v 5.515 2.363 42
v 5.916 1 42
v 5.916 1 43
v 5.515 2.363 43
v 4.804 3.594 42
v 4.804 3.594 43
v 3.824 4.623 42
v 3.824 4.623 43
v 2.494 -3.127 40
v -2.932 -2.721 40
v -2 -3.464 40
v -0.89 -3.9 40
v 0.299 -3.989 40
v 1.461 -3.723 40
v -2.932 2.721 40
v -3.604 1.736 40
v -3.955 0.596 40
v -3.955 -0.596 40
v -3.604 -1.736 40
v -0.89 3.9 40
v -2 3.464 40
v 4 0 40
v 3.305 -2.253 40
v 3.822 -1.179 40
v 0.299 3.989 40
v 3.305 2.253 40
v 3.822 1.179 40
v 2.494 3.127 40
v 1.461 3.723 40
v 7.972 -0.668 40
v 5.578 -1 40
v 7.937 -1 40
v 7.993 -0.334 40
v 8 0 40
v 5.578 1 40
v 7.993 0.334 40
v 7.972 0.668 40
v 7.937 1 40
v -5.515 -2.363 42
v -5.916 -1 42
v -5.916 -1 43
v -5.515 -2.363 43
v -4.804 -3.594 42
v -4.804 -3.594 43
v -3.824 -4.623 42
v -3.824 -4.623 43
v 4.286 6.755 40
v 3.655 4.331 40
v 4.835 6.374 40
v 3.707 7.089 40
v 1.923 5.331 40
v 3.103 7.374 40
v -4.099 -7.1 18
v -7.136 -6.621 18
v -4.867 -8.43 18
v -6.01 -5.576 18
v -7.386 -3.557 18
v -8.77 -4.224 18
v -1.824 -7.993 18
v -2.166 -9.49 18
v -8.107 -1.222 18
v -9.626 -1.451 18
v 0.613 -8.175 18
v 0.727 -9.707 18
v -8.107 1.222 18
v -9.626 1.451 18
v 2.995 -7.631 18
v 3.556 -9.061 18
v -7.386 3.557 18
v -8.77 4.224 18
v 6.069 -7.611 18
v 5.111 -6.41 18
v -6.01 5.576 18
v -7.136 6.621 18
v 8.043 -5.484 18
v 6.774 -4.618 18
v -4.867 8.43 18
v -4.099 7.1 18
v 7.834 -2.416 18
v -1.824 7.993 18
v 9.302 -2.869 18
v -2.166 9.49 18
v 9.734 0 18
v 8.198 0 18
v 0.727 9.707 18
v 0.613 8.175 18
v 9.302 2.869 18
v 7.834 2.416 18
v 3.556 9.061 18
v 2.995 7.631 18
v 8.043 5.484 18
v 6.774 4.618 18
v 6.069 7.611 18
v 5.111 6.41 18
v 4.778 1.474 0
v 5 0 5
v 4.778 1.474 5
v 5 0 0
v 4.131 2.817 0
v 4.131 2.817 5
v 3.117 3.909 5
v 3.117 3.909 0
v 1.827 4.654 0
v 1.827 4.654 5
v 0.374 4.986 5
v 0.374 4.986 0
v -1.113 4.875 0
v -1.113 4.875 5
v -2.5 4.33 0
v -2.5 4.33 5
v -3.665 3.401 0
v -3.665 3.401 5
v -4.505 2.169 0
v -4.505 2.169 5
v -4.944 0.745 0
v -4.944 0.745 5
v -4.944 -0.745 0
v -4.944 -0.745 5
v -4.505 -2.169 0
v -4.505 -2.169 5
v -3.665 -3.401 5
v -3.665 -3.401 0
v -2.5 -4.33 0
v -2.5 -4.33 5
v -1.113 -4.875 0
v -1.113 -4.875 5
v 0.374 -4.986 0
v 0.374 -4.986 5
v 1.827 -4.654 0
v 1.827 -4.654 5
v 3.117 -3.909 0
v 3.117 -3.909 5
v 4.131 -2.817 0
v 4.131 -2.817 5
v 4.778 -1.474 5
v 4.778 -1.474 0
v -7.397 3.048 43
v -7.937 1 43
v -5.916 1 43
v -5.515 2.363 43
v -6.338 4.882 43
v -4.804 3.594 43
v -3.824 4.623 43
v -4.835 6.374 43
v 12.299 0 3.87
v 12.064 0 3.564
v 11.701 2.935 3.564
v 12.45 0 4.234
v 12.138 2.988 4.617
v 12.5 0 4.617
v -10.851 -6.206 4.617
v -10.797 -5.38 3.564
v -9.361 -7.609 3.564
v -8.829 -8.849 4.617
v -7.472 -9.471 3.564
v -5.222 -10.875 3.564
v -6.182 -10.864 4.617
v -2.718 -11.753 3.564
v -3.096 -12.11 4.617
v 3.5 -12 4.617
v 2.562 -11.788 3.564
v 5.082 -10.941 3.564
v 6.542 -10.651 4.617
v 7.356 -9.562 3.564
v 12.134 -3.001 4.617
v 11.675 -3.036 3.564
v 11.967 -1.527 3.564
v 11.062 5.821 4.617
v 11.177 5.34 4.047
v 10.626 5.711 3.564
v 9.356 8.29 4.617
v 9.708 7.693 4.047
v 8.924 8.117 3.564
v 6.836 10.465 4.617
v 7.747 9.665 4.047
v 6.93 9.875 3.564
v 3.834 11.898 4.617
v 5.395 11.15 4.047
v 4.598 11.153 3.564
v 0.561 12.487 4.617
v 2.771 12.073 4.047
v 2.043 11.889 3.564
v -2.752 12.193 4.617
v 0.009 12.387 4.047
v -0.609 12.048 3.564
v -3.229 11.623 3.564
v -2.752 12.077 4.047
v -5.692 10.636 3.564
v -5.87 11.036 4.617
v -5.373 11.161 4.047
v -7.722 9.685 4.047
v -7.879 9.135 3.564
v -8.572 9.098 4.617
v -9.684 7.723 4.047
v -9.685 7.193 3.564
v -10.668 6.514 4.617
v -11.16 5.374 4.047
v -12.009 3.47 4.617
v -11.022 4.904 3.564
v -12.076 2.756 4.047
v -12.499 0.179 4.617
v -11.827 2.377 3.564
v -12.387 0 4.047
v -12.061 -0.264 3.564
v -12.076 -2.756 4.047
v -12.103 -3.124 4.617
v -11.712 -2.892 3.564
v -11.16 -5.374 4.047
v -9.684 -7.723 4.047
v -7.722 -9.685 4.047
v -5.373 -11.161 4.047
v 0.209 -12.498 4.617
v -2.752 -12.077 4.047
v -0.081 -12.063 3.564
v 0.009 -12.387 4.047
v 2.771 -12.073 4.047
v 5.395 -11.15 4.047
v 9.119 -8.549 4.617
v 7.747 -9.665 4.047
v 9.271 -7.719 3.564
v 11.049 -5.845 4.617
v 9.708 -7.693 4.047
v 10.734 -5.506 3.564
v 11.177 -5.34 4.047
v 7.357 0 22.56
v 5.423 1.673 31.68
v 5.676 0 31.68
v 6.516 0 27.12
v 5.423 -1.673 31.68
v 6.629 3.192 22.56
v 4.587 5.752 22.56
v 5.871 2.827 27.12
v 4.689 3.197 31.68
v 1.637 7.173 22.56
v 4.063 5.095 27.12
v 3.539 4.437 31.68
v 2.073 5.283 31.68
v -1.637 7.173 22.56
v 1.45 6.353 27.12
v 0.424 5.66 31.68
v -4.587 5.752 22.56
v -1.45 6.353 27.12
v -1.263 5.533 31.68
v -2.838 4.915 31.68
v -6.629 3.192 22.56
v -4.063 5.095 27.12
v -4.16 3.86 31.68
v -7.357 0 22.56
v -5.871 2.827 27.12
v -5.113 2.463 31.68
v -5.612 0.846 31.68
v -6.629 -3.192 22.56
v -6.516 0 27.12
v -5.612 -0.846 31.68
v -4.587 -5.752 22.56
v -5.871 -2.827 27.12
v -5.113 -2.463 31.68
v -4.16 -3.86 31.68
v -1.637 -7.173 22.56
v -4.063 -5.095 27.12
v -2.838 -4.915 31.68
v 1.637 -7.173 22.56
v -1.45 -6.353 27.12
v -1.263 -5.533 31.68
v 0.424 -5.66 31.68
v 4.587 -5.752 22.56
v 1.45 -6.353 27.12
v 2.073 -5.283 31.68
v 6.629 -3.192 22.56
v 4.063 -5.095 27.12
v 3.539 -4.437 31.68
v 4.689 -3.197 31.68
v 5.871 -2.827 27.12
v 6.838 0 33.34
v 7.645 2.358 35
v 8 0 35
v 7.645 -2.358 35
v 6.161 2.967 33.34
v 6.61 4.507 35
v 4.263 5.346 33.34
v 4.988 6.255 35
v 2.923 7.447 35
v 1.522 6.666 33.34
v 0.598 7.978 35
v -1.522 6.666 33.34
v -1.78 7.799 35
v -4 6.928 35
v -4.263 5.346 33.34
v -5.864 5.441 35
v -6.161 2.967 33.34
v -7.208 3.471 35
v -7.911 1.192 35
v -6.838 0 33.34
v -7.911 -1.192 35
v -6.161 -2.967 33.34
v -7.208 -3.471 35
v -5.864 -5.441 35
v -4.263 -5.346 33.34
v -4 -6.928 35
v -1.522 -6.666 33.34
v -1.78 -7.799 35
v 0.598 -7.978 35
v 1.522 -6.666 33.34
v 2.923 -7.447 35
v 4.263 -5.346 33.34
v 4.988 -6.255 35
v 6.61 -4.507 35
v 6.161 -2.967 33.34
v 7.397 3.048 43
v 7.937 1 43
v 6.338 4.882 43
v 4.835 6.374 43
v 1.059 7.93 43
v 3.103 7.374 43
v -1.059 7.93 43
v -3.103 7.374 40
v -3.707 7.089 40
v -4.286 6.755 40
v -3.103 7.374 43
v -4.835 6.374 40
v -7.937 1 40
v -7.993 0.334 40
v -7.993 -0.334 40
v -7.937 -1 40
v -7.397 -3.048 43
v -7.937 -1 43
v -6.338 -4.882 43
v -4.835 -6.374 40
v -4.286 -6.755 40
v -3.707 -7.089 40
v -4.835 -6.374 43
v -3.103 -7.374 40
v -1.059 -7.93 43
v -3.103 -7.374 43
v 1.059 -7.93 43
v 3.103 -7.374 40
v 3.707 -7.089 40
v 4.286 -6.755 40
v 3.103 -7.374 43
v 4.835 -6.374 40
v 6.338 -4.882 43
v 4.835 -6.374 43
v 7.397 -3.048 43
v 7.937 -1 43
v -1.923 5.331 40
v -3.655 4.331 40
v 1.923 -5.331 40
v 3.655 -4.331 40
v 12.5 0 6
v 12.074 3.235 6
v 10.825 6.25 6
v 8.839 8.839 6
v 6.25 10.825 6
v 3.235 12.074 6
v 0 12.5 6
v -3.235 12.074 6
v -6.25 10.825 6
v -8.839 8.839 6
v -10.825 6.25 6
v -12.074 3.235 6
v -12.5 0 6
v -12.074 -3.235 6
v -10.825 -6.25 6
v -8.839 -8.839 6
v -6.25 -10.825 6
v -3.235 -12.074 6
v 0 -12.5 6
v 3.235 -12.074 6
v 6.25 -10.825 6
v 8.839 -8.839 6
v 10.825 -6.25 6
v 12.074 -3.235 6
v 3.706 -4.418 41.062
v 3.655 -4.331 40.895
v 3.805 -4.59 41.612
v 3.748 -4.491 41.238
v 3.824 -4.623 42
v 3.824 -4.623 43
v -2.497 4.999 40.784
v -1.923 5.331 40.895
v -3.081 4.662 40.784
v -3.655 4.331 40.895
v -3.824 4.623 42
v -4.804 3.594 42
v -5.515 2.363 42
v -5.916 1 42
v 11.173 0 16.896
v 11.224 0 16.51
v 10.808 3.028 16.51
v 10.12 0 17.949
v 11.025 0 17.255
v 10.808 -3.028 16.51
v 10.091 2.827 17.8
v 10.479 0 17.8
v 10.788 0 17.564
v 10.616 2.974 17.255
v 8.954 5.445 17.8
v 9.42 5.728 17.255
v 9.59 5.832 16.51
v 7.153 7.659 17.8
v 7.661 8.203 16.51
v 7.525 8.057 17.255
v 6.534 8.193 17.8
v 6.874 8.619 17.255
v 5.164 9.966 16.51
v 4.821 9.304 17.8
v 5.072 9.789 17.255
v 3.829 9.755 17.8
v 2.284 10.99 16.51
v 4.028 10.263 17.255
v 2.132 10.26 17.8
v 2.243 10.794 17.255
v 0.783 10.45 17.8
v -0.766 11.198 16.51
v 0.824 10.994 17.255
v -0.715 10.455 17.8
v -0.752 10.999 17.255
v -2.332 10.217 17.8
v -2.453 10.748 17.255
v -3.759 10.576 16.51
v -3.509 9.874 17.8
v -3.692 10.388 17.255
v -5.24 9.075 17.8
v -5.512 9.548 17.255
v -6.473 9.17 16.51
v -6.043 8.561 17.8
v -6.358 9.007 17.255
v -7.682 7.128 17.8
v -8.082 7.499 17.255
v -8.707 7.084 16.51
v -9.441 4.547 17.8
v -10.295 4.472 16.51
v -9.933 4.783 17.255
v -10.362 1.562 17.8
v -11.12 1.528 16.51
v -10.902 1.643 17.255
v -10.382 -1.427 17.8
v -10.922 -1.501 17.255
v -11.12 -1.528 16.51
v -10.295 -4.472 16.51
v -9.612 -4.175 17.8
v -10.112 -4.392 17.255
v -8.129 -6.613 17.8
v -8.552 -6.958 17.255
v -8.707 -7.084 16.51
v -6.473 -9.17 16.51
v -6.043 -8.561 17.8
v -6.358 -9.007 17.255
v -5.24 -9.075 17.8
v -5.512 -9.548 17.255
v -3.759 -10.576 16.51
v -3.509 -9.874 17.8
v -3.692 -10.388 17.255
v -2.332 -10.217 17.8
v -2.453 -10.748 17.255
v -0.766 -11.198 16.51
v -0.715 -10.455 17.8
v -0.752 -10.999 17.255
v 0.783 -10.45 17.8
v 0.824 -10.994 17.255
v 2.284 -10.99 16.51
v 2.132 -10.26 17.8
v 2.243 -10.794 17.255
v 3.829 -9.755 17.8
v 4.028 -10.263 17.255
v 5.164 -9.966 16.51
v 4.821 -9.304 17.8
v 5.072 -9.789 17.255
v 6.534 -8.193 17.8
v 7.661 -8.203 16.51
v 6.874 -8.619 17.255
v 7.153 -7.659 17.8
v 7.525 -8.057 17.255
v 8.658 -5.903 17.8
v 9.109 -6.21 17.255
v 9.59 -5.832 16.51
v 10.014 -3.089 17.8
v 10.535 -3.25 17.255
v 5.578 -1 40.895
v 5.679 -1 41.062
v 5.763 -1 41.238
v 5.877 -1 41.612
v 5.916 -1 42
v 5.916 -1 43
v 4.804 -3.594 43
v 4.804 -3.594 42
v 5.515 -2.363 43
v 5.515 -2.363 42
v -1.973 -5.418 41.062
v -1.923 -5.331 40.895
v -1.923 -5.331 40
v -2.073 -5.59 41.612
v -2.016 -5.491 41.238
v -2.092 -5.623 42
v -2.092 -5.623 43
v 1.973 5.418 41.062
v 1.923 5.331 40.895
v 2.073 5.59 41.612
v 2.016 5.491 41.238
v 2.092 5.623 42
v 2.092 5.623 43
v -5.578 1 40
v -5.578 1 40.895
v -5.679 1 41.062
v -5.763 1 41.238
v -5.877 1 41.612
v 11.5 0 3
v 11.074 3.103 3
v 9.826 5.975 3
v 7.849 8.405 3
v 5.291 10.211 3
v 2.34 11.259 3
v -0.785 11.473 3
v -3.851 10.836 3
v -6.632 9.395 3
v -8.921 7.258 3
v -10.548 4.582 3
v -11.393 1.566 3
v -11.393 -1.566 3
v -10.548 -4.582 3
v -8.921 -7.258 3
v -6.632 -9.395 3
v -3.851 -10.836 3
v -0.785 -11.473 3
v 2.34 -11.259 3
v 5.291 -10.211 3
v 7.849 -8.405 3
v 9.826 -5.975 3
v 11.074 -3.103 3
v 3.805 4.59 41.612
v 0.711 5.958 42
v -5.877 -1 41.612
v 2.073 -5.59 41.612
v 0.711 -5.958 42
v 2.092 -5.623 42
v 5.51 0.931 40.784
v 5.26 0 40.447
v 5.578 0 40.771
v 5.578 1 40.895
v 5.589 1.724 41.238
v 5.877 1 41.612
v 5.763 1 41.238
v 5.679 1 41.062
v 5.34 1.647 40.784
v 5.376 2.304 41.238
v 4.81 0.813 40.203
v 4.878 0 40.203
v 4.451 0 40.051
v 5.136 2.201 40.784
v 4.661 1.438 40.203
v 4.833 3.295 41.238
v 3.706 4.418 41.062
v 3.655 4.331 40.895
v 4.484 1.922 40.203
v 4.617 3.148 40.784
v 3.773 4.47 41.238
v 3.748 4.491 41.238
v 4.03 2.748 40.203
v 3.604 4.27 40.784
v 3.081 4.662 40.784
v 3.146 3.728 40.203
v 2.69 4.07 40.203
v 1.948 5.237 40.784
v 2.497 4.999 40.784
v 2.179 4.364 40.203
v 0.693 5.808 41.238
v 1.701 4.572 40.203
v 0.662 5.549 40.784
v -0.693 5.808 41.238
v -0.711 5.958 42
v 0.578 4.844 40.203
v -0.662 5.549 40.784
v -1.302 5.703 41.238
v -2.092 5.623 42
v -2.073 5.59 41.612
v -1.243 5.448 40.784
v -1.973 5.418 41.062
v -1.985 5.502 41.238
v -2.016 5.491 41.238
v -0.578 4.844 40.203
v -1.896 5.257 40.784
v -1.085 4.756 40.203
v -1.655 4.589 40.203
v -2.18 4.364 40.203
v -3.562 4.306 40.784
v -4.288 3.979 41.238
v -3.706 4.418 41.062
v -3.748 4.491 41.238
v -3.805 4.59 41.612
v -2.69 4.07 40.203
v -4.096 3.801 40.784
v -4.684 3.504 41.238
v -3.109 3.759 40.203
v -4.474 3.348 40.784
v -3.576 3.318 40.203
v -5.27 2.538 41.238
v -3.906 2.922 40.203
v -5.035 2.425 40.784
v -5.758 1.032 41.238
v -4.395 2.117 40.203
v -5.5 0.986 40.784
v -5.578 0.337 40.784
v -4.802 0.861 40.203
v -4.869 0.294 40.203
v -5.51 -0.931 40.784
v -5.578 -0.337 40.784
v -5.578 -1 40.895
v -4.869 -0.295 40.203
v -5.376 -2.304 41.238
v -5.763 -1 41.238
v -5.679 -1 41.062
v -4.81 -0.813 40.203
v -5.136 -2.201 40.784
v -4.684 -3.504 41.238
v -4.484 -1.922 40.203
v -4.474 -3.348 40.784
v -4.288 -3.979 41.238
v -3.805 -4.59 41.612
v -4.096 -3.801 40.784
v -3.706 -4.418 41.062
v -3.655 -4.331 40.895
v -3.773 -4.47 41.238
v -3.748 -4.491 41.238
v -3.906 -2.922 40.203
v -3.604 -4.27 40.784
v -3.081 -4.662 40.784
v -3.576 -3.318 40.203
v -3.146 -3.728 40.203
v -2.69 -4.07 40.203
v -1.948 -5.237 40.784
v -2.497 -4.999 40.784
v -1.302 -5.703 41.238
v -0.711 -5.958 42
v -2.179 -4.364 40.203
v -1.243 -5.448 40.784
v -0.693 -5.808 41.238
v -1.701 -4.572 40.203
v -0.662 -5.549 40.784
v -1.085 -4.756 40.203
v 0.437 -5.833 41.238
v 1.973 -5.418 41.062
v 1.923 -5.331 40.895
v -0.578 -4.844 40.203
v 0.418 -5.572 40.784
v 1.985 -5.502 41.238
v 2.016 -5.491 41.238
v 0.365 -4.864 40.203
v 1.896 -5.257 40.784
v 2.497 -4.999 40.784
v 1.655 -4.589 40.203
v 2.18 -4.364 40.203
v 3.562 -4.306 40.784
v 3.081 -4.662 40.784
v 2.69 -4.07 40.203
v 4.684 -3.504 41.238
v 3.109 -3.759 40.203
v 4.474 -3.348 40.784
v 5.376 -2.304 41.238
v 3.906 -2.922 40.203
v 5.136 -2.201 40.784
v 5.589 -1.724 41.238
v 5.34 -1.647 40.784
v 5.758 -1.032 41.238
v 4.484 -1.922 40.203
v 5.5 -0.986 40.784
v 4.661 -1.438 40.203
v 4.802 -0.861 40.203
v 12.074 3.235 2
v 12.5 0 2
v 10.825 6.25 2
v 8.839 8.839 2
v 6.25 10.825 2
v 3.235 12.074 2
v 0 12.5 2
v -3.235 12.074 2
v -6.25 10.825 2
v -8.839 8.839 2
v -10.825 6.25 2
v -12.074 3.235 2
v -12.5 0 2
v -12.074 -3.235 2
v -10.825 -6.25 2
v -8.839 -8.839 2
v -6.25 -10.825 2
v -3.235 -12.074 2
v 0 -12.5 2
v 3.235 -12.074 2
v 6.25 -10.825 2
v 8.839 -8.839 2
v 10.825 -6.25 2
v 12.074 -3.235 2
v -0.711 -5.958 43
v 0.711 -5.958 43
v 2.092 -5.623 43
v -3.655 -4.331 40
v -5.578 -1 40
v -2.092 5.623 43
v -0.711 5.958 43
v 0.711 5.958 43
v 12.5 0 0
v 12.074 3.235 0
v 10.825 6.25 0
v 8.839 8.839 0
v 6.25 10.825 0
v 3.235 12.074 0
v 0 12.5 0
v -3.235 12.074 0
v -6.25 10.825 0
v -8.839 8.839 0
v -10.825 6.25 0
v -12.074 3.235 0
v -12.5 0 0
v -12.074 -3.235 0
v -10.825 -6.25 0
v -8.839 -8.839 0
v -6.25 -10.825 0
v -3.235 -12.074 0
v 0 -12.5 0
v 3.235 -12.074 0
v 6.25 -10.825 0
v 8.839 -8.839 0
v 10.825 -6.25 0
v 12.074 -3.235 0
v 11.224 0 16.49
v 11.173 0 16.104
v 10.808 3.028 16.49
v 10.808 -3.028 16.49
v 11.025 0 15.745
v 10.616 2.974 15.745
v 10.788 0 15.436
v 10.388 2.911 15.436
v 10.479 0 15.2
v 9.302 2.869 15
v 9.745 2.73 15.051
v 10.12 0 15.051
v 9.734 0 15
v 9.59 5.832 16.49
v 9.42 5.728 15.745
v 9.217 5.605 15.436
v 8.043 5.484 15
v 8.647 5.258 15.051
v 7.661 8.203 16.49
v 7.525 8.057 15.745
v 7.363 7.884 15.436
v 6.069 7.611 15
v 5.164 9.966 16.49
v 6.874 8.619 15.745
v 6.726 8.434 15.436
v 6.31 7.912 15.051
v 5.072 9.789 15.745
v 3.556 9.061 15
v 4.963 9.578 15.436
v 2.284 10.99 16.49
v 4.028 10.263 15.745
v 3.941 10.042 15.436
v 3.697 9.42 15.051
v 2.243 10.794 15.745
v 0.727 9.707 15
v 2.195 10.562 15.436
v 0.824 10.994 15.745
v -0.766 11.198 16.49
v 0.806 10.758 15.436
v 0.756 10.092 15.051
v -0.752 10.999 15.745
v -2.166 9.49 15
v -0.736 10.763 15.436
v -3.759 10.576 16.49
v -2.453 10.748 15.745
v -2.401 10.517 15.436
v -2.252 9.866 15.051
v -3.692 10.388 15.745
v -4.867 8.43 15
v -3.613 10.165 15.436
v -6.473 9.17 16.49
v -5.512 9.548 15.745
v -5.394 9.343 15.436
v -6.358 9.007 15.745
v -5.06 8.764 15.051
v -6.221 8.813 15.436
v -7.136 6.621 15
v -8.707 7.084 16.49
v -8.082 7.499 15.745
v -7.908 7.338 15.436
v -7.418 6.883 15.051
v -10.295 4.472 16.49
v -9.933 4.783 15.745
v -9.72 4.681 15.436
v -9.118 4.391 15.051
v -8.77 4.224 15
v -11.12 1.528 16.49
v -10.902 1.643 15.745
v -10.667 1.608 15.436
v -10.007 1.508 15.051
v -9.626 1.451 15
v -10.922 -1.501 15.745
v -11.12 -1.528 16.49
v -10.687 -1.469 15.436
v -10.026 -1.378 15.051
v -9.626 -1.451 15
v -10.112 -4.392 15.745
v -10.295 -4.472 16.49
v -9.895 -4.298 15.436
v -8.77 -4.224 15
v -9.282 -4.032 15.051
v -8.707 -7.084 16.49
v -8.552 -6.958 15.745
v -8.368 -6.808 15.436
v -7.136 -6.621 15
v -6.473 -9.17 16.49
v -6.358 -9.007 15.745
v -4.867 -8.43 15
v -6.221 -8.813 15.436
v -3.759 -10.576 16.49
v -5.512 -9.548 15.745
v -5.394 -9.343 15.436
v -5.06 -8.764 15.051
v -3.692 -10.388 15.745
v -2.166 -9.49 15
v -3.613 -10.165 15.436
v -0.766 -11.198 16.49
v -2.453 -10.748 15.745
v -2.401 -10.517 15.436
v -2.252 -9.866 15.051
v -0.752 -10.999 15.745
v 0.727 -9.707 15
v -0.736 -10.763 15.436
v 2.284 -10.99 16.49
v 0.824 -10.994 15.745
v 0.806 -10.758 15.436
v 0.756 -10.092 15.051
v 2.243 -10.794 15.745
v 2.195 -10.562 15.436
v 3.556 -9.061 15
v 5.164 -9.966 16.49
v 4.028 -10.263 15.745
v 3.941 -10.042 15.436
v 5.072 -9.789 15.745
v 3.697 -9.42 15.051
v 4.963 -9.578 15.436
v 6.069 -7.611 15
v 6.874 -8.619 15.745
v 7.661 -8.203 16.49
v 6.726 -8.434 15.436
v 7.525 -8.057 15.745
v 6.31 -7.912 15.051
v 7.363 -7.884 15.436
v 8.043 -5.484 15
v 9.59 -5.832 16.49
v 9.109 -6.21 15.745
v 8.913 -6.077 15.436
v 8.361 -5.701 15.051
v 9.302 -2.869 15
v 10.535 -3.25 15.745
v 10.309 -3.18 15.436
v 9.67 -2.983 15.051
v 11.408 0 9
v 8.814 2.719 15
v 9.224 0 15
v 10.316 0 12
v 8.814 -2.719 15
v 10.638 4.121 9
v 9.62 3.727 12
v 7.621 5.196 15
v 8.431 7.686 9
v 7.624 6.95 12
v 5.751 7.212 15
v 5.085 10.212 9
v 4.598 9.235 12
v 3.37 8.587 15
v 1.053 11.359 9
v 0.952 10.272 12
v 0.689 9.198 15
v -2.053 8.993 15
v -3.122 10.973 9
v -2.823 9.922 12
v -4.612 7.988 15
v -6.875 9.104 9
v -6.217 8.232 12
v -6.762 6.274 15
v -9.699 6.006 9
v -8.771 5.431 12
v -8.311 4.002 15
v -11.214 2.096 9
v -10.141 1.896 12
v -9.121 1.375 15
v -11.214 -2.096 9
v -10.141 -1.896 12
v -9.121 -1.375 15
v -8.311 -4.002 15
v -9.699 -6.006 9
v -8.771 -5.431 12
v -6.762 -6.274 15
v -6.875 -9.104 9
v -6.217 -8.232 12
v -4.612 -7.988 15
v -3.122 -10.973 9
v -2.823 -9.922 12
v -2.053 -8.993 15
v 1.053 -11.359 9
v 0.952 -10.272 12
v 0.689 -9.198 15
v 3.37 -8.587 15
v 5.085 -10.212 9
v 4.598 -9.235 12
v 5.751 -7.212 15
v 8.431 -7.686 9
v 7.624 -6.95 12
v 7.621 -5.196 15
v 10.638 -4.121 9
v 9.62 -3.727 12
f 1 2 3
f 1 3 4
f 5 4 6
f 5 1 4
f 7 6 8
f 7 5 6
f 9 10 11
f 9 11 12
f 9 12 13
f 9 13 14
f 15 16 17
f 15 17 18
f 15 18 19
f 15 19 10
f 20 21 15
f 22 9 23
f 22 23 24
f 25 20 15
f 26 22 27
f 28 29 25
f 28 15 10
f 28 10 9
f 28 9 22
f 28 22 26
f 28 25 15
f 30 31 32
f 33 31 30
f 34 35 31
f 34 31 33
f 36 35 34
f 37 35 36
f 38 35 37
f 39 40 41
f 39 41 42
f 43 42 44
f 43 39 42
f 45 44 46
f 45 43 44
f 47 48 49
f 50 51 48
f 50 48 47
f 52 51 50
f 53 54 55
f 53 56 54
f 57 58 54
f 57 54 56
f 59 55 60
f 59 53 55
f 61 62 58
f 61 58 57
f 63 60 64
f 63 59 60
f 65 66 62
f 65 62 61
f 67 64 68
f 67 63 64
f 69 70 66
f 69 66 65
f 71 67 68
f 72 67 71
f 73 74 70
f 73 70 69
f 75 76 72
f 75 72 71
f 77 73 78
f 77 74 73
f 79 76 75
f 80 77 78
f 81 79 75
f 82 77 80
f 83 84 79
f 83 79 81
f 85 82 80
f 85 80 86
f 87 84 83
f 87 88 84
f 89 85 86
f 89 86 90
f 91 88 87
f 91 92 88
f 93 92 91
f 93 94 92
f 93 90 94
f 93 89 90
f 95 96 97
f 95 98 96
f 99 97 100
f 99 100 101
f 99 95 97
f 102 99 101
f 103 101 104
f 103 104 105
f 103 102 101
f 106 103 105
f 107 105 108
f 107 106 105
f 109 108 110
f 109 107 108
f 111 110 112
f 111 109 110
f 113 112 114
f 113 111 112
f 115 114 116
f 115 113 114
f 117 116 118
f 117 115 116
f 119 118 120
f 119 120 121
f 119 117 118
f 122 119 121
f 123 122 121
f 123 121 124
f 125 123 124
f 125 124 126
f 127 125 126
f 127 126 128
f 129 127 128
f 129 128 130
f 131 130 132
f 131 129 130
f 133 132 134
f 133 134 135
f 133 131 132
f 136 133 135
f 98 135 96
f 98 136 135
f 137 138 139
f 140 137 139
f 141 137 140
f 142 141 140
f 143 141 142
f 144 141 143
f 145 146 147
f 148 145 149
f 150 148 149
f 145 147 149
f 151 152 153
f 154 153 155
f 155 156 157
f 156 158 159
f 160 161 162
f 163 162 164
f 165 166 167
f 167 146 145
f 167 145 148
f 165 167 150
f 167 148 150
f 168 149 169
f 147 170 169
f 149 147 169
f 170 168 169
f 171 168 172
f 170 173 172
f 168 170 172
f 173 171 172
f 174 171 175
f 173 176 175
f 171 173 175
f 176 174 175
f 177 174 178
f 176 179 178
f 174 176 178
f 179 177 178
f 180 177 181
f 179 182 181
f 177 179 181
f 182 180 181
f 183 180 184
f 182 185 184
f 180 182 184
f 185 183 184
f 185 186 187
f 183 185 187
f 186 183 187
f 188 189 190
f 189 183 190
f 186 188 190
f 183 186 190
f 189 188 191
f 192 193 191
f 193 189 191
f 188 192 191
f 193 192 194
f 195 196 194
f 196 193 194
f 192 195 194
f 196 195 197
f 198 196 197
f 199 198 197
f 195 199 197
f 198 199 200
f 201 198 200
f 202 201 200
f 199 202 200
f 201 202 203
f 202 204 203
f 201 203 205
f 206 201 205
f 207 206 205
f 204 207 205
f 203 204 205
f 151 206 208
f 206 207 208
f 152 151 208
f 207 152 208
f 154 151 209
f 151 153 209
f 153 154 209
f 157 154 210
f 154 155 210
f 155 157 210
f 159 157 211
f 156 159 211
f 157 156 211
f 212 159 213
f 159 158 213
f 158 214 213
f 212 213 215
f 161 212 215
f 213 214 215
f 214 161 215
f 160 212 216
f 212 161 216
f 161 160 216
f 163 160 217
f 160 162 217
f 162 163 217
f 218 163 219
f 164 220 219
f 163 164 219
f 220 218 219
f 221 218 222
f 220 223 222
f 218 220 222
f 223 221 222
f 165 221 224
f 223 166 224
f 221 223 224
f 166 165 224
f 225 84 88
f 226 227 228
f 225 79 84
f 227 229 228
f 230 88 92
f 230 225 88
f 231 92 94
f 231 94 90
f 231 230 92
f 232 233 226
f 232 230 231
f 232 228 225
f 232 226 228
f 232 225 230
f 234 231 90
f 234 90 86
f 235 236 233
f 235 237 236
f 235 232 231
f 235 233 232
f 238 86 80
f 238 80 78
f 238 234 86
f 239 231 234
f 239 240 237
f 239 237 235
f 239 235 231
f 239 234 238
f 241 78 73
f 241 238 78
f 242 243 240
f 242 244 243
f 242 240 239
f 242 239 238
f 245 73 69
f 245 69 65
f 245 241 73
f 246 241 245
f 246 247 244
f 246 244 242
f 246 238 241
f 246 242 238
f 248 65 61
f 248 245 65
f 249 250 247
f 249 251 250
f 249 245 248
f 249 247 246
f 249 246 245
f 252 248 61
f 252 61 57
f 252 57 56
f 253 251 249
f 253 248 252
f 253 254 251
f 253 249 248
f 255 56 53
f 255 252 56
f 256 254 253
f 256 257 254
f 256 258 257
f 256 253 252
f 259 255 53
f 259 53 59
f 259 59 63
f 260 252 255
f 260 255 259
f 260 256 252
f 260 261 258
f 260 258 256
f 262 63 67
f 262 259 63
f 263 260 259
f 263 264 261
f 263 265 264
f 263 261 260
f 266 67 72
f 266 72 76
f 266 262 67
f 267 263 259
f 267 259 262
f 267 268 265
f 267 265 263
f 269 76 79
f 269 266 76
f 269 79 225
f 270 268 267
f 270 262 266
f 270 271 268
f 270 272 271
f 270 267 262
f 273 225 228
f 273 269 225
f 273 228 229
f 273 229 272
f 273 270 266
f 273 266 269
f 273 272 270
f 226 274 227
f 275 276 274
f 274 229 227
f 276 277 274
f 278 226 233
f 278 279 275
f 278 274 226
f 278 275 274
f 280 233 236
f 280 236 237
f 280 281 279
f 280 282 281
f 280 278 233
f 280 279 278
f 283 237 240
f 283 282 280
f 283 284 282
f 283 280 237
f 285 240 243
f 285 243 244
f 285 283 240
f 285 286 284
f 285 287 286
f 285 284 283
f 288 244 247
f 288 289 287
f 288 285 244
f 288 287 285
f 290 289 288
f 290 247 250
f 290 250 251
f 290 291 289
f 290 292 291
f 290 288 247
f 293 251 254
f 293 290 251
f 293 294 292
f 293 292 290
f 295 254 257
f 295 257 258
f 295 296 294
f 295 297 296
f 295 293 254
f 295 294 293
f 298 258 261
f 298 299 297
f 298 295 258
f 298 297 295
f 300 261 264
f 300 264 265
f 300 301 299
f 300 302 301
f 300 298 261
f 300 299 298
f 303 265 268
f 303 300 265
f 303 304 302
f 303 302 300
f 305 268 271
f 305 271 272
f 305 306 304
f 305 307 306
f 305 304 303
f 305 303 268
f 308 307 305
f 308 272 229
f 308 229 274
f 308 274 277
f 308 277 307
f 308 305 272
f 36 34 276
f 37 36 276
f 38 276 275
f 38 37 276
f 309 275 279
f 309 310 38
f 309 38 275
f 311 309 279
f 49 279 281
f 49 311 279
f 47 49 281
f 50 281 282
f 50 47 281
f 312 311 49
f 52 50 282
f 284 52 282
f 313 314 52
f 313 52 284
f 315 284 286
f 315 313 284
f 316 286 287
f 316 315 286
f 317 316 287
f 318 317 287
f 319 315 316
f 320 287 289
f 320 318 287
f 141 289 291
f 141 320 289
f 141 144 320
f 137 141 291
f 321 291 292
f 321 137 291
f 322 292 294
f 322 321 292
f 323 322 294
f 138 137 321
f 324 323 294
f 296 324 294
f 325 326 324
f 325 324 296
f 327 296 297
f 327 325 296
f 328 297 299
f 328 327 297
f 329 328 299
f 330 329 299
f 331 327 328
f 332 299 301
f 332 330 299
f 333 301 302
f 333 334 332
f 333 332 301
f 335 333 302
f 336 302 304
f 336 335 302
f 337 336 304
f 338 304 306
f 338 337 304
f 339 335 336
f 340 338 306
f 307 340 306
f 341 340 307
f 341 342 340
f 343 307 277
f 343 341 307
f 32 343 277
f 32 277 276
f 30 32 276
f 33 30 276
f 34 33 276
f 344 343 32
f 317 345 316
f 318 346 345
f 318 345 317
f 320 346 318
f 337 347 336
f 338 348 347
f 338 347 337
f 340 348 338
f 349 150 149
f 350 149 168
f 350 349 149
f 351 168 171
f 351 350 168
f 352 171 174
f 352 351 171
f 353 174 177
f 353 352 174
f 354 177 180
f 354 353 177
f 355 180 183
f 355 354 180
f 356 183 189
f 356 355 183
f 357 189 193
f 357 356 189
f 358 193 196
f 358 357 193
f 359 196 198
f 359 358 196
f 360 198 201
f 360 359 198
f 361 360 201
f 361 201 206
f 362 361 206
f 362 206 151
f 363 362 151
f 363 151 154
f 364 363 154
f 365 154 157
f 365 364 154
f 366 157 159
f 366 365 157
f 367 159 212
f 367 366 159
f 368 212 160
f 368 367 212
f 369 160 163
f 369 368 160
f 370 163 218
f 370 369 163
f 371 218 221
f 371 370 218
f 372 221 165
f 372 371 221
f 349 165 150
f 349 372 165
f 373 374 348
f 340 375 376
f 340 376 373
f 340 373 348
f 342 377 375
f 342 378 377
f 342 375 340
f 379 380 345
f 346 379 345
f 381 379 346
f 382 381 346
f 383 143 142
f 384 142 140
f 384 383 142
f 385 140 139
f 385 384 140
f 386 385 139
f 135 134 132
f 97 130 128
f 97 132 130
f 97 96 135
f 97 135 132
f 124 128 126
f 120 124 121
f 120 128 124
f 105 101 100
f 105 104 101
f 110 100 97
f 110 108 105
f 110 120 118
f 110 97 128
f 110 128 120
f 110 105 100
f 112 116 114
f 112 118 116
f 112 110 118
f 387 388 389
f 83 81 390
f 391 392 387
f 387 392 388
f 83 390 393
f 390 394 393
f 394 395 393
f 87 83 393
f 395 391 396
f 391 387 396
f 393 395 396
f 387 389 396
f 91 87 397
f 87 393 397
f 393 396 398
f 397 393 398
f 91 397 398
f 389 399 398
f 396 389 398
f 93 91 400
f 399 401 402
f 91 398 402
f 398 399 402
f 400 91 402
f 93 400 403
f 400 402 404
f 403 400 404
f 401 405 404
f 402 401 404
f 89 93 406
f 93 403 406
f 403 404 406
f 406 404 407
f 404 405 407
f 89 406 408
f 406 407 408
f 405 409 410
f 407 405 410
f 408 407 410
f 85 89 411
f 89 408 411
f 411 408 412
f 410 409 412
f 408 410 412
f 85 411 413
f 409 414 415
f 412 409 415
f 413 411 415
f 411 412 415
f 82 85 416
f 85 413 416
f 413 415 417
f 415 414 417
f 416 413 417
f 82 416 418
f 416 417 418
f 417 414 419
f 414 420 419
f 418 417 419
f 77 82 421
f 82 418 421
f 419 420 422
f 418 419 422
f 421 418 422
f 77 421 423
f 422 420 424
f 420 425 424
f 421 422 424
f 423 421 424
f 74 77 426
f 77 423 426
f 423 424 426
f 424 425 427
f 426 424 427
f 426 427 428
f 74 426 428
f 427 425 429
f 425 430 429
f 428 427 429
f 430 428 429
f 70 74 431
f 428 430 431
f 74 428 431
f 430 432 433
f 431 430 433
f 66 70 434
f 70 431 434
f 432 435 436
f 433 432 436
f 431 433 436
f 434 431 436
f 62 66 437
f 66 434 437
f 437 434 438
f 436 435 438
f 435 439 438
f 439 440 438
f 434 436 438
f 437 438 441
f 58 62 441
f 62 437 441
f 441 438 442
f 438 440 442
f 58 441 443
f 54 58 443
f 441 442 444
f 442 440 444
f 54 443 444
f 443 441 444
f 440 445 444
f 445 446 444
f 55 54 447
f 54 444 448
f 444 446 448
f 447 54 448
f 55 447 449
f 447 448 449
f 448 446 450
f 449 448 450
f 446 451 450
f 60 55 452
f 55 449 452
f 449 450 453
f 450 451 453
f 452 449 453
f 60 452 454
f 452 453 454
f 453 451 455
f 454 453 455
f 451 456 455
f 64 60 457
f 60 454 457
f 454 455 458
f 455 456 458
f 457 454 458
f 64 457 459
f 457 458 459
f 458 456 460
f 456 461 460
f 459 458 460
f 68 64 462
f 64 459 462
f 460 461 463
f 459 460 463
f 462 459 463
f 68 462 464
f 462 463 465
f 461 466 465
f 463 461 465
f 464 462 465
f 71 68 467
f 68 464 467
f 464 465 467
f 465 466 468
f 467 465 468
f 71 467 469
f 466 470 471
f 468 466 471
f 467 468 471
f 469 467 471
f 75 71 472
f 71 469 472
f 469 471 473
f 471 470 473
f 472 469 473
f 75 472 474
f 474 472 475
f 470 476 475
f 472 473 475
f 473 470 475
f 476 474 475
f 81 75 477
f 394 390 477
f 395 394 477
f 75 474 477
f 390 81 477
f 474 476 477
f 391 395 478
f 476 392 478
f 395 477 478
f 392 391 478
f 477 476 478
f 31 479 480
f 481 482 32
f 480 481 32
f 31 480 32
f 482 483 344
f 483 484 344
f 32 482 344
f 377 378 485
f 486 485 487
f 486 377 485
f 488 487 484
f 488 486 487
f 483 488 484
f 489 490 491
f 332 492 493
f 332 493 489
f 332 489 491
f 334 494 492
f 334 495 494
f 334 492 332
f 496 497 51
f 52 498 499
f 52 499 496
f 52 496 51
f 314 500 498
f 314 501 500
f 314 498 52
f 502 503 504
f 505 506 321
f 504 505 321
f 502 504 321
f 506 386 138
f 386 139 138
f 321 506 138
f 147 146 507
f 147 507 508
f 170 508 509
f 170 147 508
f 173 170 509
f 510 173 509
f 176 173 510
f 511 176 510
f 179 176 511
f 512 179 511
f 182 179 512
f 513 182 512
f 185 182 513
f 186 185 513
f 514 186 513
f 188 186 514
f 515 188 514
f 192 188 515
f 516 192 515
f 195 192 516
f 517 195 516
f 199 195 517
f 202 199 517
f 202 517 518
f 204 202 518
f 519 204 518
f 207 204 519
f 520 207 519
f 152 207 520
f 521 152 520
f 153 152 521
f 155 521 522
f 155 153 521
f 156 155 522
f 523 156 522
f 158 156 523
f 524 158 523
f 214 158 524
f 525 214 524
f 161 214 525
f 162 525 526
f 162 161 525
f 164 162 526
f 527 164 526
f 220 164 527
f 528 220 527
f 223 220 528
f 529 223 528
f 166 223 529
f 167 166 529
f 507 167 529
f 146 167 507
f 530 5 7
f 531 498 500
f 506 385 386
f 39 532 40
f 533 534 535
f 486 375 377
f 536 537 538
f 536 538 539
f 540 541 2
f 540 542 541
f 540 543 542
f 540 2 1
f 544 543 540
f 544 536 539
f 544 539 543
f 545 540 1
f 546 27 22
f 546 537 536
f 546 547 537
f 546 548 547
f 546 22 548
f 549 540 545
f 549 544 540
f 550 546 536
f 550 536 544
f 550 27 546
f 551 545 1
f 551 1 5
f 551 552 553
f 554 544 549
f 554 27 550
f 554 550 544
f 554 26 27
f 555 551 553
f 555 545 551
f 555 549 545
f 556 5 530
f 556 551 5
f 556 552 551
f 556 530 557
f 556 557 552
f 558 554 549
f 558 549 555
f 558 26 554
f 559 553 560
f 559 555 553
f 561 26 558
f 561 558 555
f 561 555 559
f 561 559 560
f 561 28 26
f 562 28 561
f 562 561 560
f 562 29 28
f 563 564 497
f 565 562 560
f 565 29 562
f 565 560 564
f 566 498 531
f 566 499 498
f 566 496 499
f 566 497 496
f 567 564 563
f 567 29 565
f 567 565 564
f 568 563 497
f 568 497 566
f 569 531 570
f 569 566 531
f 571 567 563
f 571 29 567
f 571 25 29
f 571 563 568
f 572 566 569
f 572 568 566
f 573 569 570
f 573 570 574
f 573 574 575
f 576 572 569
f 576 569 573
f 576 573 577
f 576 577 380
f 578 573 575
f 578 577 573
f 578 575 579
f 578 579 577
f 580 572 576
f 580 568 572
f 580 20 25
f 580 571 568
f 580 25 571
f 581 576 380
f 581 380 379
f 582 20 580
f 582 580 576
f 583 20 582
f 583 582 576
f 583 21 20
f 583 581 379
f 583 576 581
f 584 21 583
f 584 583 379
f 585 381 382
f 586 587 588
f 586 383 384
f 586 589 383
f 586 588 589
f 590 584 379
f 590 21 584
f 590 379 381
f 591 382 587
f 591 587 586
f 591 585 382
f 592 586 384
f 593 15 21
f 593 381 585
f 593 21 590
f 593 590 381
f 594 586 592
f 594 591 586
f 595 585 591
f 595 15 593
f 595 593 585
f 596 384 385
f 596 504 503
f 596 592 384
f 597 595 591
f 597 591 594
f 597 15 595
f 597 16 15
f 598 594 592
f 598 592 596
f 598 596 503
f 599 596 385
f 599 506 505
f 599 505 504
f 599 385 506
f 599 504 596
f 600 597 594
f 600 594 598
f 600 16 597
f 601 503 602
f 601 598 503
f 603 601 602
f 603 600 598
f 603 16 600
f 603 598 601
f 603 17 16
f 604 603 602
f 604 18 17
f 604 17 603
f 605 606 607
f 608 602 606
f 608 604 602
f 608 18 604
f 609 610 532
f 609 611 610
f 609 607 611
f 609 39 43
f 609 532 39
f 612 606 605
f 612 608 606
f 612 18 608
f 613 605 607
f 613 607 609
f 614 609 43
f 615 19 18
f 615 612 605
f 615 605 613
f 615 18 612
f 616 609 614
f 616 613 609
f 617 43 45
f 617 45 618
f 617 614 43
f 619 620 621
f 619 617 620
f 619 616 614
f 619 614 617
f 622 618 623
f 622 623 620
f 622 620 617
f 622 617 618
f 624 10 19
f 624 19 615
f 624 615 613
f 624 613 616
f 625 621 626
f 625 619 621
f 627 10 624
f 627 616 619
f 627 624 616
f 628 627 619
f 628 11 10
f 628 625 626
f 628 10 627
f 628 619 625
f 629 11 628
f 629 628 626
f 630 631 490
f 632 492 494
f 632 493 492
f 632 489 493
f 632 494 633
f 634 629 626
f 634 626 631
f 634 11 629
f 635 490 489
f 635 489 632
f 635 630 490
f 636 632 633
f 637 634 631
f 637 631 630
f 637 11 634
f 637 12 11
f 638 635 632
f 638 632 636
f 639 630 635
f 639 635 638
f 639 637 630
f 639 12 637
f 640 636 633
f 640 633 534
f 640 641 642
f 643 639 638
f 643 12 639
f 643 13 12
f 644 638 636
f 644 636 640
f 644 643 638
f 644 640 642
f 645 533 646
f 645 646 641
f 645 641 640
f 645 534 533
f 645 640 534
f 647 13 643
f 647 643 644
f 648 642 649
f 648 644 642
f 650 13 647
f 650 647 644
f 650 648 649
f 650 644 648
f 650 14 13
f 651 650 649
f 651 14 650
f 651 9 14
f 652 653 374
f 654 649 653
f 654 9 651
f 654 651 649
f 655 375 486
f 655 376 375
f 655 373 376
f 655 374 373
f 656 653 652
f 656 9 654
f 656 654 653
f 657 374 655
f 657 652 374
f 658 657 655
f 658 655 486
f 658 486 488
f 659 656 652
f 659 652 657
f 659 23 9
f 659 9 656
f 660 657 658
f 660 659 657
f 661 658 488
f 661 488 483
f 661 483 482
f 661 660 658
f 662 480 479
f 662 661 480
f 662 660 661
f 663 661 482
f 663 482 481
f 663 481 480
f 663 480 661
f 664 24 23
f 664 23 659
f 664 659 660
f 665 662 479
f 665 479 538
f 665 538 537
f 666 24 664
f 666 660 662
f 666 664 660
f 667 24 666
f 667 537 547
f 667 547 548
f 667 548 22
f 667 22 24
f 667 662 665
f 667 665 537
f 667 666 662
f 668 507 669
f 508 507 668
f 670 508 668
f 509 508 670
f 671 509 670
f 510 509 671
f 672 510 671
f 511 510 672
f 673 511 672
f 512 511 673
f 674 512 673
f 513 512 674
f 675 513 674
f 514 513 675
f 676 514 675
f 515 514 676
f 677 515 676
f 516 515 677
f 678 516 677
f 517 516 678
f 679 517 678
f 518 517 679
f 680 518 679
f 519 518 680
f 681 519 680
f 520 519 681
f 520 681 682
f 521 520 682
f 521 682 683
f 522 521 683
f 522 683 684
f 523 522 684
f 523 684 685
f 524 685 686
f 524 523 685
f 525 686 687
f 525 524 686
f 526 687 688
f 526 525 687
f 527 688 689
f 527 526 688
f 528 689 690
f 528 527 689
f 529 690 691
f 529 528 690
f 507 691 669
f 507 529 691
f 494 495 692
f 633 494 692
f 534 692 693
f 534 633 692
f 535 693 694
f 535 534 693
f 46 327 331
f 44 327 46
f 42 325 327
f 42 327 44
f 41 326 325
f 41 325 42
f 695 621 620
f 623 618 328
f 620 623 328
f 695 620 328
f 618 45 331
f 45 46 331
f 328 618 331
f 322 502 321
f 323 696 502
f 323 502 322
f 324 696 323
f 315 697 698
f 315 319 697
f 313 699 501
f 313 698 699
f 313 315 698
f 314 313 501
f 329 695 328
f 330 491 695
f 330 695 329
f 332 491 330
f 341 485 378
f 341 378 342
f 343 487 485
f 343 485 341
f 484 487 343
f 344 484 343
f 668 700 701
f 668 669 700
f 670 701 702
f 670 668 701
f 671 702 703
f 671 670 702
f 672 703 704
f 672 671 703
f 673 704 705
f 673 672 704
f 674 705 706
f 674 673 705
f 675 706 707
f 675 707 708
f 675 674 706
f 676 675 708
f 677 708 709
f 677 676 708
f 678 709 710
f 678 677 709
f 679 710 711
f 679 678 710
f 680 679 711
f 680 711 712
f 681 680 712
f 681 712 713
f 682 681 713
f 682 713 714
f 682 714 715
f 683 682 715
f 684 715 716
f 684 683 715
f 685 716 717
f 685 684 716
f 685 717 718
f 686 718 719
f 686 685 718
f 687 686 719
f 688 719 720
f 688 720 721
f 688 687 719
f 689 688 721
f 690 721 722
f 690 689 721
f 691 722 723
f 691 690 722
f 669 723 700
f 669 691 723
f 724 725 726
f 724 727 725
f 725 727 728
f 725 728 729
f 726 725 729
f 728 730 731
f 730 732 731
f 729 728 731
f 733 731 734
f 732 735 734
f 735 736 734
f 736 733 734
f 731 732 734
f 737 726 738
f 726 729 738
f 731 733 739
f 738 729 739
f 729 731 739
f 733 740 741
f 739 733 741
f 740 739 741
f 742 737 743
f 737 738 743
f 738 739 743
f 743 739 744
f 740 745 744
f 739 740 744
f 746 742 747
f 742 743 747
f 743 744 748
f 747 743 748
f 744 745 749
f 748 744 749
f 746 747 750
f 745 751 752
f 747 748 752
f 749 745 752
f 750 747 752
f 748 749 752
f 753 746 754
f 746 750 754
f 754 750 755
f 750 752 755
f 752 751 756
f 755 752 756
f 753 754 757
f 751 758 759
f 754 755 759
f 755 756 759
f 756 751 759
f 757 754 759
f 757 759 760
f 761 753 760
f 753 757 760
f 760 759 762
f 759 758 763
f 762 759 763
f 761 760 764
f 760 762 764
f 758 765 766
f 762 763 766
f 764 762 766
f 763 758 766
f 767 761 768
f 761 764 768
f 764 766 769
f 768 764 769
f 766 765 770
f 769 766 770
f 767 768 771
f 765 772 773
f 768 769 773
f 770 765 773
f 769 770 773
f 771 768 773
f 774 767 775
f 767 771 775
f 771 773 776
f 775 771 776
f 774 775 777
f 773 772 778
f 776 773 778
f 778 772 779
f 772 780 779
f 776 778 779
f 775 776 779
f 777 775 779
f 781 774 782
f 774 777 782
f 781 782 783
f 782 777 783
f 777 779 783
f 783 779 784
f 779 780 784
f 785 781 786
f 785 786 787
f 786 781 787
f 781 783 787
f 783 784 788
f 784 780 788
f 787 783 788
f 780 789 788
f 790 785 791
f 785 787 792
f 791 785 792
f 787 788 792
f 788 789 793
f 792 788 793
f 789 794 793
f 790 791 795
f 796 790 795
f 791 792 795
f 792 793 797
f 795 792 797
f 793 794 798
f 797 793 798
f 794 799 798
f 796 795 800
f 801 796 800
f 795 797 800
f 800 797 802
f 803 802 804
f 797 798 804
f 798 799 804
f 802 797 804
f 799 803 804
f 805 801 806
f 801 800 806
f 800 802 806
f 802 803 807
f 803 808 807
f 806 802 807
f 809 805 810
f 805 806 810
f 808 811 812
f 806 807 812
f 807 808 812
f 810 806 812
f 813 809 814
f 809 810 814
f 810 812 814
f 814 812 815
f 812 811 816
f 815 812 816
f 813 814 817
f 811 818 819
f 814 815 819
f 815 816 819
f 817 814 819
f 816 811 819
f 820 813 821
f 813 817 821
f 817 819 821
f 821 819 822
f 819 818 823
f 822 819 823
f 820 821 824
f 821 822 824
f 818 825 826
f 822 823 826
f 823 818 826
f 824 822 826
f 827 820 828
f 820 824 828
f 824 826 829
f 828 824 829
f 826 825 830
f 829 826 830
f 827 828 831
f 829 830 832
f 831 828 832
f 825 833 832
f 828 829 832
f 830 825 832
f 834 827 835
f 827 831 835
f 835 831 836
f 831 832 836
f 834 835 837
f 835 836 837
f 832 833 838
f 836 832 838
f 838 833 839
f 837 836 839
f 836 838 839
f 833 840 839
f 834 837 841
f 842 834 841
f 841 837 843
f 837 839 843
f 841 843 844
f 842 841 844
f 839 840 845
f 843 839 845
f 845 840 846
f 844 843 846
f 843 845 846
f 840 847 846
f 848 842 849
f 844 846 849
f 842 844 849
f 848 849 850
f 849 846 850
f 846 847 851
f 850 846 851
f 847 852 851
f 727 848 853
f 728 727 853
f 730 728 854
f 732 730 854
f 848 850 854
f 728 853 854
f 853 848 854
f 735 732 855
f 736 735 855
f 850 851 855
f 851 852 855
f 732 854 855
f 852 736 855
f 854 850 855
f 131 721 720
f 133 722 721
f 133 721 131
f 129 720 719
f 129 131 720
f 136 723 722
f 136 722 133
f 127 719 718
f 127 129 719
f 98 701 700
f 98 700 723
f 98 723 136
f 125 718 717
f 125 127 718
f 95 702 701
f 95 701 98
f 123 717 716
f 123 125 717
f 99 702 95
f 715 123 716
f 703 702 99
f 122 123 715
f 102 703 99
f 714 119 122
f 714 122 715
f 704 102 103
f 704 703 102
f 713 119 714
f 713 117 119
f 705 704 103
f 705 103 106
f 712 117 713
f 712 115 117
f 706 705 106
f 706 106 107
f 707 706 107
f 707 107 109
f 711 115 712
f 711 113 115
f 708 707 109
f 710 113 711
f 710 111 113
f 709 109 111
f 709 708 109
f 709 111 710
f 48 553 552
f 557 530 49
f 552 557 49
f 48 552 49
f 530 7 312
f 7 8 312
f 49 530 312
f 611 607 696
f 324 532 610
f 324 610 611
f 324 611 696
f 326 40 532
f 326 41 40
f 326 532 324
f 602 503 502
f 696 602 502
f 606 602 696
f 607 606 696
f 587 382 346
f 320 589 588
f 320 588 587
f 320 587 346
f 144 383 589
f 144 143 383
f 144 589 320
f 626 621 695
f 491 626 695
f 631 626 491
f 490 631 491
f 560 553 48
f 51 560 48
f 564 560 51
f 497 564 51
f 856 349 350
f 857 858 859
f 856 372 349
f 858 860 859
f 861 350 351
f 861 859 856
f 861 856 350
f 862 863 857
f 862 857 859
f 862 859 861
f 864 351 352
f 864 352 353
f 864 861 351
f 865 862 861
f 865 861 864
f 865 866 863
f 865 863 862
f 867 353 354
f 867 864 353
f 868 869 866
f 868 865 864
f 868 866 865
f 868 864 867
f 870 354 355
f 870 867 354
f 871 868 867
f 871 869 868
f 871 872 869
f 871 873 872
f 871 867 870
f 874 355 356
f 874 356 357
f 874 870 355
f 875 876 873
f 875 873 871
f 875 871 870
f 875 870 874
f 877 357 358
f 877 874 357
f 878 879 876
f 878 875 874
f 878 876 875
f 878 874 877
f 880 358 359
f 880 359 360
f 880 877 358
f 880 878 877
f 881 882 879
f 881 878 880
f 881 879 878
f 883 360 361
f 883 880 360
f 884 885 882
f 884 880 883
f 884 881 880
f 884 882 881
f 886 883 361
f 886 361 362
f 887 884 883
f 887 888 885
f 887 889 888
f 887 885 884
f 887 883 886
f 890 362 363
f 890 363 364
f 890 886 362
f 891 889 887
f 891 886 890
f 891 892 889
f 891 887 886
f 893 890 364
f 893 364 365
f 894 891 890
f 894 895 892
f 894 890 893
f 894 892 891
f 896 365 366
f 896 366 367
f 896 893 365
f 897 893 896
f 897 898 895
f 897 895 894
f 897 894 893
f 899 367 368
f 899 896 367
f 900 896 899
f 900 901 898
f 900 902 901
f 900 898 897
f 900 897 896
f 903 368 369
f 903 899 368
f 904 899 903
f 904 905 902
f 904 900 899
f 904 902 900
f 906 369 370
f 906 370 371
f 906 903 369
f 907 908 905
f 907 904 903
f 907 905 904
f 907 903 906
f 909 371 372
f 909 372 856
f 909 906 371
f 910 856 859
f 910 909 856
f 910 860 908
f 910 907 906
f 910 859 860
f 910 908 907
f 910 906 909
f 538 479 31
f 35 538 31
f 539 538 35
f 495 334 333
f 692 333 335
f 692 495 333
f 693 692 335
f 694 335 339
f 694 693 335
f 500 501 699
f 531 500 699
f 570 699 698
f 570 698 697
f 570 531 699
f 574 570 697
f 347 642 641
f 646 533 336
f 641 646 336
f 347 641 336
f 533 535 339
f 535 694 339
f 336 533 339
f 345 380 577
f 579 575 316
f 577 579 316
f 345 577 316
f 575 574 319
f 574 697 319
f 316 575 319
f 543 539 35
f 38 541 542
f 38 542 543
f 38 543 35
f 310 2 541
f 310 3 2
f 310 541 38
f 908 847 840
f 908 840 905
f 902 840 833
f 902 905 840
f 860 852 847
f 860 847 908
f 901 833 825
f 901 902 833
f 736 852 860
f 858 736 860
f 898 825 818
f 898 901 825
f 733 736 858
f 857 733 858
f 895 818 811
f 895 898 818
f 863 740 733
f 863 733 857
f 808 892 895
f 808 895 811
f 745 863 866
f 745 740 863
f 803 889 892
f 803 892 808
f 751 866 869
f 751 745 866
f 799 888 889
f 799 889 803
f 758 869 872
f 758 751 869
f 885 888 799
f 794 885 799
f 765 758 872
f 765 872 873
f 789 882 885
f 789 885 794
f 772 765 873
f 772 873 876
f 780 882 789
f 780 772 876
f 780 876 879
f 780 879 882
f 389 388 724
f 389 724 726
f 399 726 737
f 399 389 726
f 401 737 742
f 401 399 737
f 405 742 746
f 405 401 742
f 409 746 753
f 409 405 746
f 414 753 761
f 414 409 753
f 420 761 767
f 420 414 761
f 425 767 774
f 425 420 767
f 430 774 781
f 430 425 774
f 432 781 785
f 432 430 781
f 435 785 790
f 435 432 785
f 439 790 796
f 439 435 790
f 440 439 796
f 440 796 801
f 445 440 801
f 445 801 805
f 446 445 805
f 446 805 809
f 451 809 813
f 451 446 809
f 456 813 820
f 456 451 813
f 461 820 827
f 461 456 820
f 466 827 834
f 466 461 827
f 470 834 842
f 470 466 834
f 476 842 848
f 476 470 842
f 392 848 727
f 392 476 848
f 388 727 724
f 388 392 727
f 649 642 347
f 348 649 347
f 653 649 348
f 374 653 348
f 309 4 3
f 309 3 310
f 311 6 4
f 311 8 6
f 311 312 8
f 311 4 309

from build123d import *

# Parameters (mm, degrees)
FILLET002_R        = 1.49
FILLET003_R        = 2
SKETCH006_W        = 7.538901
SKETCH006_H        = 2
POCKET_DEPTH       = 3
POLARPATTERN_COUNT = 6
FILLET017_R        = 1.49


with BuildPart() as part:
    # Sketch001 → Revolution001 (revolve)
    with BuildSketch(Plane.XZ):
        Polygon((0, 5), (5, 5), (5, 0), (12.5, 0), (12.5, 2), (11.5, 3), (12.5, 4), (12.5, 6), (9.224268, 15), (11.224268, 15), (11.224268, 18), (8.198129, 18), (5.675519, 31.680297), (8, 35), (8, 43), (6, 43), (6, 40), (0, 40), align=None)
    revolve(axis=Axis((0, 0, 0), (0, 0, 1)))

    # Fillet002
    fillet002_edges = [part.edges().sort_by_distance(p)[0] for p in [
        (12, 0, 3.5),
        (-12.5, 0, 4),
    ]]
    fillet(fillet002_edges, radius=FILLET002_R)

    # Fillet003
    fillet003_edges = [part.edges().sort_by_distance(p)[0] for p in [
        (-6, 0, 40),
    ]]
    fillet(fillet003_edges, radius=FILLET003_R)

    # Sketch006 → Pocket (cut)
    with BuildSketch(Plane(origin=(0, 0, 43), x_dir=(-1, 0, 0), z_dir=(0, 0, 1))):
        with Locations((9.347359, 0)):
            Rectangle(SKETCH006_W, SKETCH006_H)
    pocket = extrude(amount=-POCKET_DEPTH, mode=Mode.SUBTRACT)

    # PolarPattern: Pocket ×6 about axis
    polarpattern_axis = Axis((0, 0, 43), (0, 0, 1))
    for i in range(1, POLARPATTERN_COUNT):
        add(pocket.rotate(polarpattern_axis, i * 360 / POLARPATTERN_COUNT), mode=Mode.SUBTRACT)

    # Fillet017
    fillet017_edges = [part.edges().sort_by_distance(p)[0] for p in [
        (-11.224268, 0, 18),
        (-11.224268, 0, 15),
    ]]
    fillet(fillet017_edges, radius=FILLET017_R)


solid = part.part
